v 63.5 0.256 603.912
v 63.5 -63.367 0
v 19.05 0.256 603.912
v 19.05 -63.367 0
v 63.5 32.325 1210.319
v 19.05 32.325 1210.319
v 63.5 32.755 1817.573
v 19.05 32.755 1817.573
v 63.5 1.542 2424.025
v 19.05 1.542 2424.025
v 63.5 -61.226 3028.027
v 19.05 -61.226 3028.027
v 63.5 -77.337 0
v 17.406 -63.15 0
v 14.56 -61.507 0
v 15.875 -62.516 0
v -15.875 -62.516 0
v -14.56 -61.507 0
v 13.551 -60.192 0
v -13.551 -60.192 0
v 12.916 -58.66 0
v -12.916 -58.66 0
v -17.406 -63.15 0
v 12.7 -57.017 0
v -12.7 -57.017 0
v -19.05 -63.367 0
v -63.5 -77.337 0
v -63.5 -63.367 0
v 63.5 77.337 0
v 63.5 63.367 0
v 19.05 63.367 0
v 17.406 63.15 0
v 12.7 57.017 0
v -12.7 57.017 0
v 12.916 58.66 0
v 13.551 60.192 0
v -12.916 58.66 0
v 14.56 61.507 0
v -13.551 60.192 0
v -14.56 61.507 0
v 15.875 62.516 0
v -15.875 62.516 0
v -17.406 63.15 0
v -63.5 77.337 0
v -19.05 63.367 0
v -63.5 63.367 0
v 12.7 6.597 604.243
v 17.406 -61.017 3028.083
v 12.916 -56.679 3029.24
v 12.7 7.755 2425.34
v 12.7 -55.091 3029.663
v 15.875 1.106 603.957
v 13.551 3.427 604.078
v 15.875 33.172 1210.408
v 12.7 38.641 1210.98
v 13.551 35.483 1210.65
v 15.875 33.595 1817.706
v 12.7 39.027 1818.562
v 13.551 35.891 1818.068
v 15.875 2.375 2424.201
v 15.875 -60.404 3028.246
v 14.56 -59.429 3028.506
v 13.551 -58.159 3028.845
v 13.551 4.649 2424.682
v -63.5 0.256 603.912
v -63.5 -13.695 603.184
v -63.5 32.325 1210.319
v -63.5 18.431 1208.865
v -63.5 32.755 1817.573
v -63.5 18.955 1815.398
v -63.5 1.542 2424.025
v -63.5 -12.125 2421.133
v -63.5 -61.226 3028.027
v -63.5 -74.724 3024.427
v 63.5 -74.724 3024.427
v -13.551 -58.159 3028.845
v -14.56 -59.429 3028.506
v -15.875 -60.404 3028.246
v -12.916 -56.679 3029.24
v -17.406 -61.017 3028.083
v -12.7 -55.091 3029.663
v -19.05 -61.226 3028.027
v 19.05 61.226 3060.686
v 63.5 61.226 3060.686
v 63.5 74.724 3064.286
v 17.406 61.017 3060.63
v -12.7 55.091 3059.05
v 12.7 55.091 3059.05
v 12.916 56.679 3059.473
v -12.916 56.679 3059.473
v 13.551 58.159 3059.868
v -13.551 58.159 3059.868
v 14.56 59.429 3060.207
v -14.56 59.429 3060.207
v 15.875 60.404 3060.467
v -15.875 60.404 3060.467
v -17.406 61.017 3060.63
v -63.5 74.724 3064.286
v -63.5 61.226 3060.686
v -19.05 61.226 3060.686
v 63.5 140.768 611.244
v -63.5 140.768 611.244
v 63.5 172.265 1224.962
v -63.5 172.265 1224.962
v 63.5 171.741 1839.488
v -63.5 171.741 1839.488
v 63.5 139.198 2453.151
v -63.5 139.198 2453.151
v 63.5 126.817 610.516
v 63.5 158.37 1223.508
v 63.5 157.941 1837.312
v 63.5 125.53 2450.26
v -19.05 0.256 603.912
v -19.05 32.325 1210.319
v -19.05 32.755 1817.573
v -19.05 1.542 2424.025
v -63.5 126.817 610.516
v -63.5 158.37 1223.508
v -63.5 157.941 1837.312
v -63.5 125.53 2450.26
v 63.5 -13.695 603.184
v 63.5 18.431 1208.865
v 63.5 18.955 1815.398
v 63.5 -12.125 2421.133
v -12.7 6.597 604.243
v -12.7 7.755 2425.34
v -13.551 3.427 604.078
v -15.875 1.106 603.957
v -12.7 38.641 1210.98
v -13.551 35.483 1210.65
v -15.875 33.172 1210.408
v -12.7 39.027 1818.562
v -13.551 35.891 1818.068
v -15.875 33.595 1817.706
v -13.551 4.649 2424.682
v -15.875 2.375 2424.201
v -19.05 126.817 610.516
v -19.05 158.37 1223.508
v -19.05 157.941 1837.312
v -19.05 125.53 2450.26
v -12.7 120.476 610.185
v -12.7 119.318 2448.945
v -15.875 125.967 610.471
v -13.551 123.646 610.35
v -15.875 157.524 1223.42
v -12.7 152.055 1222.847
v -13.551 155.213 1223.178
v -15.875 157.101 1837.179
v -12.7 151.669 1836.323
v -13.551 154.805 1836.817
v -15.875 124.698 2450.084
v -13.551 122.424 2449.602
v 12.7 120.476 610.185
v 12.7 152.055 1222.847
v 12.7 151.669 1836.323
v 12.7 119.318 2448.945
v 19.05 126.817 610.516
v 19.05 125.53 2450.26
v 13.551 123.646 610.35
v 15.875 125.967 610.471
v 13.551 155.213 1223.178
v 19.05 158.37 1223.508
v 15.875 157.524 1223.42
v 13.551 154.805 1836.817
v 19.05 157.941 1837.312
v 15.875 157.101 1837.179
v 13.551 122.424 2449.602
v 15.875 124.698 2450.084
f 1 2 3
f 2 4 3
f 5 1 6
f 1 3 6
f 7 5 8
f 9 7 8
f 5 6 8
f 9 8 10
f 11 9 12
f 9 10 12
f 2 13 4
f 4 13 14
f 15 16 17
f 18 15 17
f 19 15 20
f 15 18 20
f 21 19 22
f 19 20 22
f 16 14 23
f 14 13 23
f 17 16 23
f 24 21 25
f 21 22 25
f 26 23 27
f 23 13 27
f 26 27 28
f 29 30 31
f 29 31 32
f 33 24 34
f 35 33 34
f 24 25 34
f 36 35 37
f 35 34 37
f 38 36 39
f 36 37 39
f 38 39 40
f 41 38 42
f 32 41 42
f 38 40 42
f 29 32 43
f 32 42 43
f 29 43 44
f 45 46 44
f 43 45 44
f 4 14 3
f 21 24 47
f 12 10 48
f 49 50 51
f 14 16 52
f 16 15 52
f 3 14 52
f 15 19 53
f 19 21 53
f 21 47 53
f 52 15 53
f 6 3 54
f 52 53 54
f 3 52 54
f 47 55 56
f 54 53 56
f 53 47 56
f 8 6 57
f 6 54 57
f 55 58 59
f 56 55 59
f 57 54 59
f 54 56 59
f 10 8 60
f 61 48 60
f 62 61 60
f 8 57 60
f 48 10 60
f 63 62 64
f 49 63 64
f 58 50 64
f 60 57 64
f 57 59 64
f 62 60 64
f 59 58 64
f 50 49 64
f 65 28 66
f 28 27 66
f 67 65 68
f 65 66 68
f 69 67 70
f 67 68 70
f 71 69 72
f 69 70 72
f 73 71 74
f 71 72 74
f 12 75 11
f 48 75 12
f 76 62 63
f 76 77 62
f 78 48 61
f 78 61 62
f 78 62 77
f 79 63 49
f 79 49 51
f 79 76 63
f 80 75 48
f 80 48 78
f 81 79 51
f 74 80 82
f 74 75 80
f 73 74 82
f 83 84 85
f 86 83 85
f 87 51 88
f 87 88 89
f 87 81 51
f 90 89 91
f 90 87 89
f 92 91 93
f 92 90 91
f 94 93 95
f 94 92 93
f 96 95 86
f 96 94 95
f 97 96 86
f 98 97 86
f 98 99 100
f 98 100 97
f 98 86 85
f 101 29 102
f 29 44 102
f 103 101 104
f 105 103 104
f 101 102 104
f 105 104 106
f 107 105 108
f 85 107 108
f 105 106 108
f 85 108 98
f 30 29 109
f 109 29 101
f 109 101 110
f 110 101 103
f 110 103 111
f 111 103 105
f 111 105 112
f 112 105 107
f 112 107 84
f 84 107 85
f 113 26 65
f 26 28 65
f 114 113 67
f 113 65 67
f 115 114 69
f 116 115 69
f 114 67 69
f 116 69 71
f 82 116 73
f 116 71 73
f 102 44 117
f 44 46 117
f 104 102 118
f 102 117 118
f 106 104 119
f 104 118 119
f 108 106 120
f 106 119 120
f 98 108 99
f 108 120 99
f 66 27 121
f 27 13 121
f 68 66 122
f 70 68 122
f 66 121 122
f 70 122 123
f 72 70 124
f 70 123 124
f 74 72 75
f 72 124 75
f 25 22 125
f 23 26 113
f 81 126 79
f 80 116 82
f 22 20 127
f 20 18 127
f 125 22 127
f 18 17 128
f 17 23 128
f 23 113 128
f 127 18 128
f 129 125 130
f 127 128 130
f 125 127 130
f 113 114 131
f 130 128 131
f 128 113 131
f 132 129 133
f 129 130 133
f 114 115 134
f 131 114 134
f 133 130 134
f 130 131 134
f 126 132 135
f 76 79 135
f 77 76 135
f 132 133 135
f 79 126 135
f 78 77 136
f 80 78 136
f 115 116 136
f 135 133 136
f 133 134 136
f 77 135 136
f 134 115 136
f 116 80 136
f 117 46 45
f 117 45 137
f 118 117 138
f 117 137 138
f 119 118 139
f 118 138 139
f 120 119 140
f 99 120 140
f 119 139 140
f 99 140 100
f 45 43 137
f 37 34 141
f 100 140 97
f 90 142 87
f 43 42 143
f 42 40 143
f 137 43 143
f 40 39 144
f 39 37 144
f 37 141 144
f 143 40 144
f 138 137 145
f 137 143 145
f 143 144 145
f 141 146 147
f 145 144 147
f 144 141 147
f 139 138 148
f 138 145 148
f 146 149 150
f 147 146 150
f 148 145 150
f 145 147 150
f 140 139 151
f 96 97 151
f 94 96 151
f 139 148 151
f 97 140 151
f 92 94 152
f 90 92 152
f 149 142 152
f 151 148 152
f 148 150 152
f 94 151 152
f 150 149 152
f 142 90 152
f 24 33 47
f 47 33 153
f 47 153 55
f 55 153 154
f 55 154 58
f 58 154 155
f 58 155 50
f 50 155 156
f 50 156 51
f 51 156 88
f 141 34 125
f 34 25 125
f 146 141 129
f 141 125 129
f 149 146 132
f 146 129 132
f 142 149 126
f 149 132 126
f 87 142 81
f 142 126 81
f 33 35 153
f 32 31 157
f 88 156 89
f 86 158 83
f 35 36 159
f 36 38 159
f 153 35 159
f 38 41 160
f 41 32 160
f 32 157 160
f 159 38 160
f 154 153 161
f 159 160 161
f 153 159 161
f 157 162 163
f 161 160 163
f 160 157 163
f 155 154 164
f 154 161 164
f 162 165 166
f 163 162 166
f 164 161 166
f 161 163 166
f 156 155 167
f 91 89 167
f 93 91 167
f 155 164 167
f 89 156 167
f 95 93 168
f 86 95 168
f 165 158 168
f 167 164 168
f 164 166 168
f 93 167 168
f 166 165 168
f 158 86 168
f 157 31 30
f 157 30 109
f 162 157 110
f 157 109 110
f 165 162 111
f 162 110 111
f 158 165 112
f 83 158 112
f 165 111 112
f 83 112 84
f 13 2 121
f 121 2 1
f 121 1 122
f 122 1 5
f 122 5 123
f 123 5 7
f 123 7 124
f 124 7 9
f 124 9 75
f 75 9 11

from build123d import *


with BuildPart() as f2:
    # F2: sweep along a path in F1
    with BuildLine(Plane.YZ) as f2_path:
        ThreePointArc((0, 0), (99.326365, 1522.178173), (0, 3044.356346))
    # F0 (on Top) → F2 (sweep)
    with BuildSketch(Plane.XY):
        with BuildLine():
            Line((-12.7, 57.016547), (-12.7, -57.016547))
            ThreePointArc((-12.7, -57.016547), (-14.559872, -61.506675), (-19.05, -63.366547))
            Line((-19.05, -63.366547), (-63.5, -63.366547))
            Line((-63.5, -63.366547), (-63.5, -77.336547))
            Line((-63.5, -77.336547), (0, -77.336547))
            Line((0, -77.336547), (63.5, -77.336547))
            Line((63.5, -77.336547), (63.5, -63.366547))
            Line((63.5, -63.366547), (19.05, -63.366547))
            ThreePointArc((19.05, -63.366547), (14.559872, -61.506675), (12.7, -57.016547))
            Line((12.7, -57.016547), (12.7, 57.016547))
            ThreePointArc((12.7, 57.016547), (14.559872, 61.506675), (19.05, 63.366547))
            Line((19.05, 63.366547), (63.5, 63.366547))
            Line((63.5, 63.366547), (63.5, 77.336547))
            Line((63.5, 77.336547), (0, 77.336547))
            Line((0, 77.336547), (-63.5, 77.336547))
            Line((-63.5, 77.336547), (-63.5, 63.366547))
            Line((-63.5, 63.366547), (-19.05, 63.366547))
            ThreePointArc((-19.05, 63.366547), (-14.559872, 61.506675), (-12.7, 57.016547))
        make_face()
    sweep(path=f2_path.line)


solid = f2.part
